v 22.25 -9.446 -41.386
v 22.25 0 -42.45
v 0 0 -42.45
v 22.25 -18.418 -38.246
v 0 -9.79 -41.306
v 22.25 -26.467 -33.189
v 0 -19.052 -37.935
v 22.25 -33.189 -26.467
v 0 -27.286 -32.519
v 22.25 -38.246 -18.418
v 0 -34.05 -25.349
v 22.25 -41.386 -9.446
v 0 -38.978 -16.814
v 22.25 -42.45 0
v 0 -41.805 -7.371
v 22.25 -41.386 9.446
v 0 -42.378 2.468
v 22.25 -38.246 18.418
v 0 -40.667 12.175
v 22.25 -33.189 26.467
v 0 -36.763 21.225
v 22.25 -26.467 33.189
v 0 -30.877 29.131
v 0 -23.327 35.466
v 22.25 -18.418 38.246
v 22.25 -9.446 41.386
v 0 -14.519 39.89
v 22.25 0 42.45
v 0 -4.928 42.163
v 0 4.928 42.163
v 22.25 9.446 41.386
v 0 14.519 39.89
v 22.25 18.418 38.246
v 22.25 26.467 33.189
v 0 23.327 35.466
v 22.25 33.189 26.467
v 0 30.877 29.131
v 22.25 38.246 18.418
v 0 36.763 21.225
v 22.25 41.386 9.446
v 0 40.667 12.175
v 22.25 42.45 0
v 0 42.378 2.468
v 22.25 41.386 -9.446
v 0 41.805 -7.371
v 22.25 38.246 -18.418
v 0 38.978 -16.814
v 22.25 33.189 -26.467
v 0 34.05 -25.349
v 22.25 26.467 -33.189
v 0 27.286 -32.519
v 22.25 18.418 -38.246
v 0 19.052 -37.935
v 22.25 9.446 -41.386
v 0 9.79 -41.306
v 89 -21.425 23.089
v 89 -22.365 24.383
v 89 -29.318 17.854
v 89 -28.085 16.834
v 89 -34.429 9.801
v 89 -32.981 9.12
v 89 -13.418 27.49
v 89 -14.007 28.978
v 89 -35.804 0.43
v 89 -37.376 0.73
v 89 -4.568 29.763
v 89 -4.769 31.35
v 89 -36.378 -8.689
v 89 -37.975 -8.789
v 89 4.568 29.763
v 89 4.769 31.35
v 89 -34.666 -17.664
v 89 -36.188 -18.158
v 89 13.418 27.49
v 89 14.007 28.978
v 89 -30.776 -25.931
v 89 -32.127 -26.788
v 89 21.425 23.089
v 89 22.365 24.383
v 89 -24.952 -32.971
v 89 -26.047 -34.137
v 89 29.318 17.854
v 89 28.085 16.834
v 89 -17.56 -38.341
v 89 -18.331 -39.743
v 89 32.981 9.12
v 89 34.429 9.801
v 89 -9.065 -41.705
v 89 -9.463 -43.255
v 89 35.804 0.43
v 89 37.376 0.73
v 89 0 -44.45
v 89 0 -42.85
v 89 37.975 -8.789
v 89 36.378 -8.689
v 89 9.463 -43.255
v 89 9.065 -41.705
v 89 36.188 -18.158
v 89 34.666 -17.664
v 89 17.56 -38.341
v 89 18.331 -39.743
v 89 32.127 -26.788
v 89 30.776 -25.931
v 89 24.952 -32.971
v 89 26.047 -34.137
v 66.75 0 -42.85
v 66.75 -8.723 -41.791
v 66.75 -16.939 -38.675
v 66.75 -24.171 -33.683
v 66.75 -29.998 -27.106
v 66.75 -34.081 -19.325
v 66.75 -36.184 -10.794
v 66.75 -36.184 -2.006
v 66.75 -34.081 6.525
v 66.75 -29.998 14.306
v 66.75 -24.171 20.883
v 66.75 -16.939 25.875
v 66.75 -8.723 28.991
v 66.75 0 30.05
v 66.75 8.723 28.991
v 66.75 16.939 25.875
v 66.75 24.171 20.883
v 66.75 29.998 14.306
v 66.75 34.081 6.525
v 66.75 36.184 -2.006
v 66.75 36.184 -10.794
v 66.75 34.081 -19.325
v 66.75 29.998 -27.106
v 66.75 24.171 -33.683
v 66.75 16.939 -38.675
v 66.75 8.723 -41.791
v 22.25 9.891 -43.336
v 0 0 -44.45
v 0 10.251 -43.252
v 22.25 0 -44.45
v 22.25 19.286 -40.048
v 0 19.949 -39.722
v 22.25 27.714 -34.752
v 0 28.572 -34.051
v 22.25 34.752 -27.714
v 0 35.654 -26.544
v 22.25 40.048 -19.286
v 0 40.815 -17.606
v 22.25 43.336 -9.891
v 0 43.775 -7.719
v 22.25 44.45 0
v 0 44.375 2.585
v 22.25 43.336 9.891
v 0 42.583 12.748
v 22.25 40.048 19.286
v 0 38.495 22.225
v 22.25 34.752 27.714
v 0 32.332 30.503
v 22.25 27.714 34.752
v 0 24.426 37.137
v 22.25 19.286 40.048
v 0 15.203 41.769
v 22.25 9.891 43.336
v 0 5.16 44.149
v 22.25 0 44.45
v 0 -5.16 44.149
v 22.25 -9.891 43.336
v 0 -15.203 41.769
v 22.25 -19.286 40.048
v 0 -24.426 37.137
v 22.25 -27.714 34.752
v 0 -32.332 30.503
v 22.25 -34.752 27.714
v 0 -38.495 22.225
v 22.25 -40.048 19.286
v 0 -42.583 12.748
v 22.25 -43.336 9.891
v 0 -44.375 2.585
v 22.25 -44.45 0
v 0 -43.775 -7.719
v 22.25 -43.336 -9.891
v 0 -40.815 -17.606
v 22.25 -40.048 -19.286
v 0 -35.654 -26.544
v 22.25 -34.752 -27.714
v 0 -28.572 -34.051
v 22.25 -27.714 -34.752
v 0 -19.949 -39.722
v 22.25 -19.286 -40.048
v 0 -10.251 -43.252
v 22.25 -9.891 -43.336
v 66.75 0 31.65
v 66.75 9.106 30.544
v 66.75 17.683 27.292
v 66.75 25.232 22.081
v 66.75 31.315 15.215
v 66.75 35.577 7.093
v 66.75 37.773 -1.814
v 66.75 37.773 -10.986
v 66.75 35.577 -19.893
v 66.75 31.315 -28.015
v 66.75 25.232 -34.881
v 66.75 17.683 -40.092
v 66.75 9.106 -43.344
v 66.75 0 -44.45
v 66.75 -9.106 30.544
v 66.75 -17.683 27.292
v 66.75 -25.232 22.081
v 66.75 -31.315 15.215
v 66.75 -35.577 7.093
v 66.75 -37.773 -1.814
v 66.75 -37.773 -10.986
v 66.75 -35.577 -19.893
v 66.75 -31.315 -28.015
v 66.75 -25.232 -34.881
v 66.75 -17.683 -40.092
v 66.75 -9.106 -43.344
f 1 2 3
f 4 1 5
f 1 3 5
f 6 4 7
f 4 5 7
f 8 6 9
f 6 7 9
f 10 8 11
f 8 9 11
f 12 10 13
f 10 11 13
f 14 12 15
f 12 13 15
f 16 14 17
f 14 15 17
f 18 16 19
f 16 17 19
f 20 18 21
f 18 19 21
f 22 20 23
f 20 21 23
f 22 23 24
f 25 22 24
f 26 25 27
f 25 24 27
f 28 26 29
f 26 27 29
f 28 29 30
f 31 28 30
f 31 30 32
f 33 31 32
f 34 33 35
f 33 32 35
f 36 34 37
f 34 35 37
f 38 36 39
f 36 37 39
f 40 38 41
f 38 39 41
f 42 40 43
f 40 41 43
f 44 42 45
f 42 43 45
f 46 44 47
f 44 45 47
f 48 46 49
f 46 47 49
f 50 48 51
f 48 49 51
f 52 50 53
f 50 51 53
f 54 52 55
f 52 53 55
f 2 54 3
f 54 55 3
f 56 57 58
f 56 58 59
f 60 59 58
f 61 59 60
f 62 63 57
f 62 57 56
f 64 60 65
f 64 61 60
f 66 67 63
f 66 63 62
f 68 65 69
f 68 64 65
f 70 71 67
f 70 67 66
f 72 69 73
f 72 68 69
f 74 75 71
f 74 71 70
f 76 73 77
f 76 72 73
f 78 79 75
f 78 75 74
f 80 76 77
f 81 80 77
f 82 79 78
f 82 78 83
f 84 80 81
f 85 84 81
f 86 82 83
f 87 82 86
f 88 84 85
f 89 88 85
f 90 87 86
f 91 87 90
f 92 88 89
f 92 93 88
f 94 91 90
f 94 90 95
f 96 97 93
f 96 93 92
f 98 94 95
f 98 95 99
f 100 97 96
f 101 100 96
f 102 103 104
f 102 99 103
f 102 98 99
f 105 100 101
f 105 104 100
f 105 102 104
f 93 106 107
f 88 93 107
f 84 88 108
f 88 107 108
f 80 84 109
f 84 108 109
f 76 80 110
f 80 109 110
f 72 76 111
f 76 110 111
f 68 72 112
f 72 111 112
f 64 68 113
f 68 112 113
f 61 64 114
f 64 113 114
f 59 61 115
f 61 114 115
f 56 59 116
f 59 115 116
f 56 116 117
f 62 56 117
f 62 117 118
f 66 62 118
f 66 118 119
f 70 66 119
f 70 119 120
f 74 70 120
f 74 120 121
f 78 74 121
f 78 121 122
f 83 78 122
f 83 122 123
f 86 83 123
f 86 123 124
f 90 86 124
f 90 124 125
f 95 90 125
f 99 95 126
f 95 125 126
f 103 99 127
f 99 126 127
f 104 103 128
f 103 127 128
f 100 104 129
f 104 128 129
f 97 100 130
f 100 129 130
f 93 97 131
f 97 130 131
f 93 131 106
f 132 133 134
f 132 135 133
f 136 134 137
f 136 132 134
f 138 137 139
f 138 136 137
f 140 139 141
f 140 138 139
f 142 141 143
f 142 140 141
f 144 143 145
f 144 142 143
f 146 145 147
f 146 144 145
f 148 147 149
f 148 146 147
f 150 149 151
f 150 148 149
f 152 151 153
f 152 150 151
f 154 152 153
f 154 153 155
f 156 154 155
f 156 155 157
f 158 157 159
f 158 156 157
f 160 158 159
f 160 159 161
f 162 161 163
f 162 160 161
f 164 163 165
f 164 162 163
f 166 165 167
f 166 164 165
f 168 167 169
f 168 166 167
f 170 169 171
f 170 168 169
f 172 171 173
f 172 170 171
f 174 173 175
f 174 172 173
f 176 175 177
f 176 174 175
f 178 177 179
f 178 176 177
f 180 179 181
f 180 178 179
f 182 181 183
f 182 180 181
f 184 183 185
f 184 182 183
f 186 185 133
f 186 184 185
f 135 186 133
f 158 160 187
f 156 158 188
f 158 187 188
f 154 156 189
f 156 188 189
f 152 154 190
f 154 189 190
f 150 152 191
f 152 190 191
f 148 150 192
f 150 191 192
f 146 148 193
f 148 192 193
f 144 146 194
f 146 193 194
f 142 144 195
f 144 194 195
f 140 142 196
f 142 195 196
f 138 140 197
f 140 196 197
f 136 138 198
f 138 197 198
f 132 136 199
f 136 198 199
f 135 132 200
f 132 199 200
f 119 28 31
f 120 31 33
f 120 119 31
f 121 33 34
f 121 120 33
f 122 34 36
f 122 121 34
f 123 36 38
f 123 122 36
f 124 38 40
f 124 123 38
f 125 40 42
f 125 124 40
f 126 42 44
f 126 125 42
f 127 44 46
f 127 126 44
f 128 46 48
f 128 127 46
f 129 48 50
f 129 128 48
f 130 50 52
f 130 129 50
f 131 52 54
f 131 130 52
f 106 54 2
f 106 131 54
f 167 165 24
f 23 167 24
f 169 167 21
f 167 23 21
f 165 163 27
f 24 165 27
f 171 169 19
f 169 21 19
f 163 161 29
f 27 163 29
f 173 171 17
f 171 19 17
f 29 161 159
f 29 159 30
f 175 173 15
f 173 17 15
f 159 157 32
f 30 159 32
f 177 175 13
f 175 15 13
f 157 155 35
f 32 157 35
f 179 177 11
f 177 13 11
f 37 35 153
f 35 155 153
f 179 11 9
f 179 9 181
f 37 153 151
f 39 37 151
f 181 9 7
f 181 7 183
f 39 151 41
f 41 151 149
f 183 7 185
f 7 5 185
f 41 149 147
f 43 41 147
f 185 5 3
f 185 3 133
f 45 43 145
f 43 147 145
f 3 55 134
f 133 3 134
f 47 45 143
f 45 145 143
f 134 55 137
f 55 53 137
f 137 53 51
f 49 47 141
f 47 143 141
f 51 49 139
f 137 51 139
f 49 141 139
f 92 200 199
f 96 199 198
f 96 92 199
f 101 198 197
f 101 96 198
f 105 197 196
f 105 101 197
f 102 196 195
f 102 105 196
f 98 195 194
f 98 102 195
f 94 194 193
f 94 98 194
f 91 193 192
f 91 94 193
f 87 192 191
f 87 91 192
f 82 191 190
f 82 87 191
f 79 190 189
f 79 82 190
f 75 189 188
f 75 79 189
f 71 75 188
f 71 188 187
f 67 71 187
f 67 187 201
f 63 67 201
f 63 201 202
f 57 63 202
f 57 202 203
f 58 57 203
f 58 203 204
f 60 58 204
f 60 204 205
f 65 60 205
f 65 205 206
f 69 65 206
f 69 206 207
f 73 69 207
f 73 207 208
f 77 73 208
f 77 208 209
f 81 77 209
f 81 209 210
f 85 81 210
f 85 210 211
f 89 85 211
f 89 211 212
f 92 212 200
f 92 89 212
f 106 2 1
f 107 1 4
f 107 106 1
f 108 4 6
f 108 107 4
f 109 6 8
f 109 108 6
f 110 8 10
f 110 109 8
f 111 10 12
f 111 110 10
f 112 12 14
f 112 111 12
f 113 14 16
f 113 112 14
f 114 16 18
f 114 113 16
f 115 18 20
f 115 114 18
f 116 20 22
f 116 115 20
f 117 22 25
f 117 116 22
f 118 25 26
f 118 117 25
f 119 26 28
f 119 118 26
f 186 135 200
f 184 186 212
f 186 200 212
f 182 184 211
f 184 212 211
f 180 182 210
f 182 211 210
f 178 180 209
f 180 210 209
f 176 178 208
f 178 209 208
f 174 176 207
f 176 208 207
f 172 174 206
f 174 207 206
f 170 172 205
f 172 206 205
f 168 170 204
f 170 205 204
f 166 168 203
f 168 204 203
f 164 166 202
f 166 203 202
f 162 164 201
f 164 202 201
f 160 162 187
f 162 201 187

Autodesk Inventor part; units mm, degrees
ref_plane "YZ Plane" through (0, 0, 0) normal (1, 0, 0) x (0, 1, 0)
ref_plane "XZ Plane" through (0, 0, 0) normal (0, 1, 0) x (-1, 0, 0)
ref_plane "XY Plane" through (0, 0, 0) normal (0, 0, 1) x (1, 0, 0)
sketch "Sketch1" plane through (0, 0, 0) normal (0, 1, 0) x (-1, 0, 0)
  line L0 (0, -44.45) -> (-22.25, -44.45)
  line L1 (-22.25, -44.45) -> (-22.25, -42.45)
  line L2 (-22.25, -42.45) -> (0, -42.45)
  line L3 (0, -42.45) -> (0, -44.45)
  line L4 (0, -42.45) -> (0, 0) construction
  line L5 (0, 0) -> (-22.25, 0)
  line L6 (-22.25, 0) -> (-22.25, -42.45) construction
  dimension "d0" = 2
  dimension "d1" = 22.25
  dimension "d15" = 88.9
revolve "Revolve1" add sketch "Sketch1" angle 360 about axis through (0, 0, 0) along (1, 0, 0)
sketch "Sketch2" plane through (0, 0, 0) normal (0, 1, 0) x (-1, 0, 0)
  line L0 (0, -44.45) -> (-22.25, -44.45) projected
  line L1 (-66.75, -44.45) -> (-89, -44.45)
  line L2 (-89, -44.45) -> (-89, -42.85)
  line L3 (-89, -42.85) -> (-66.75, -42.85)
  line L4 (-66.75, -42.85) -> (-66.75, -44.45)
  line L5 (-22.25, -44.45) -> (-66.75, -44.45) construction
  line L6 (-66.75, -42.85) -> (-66.75, -6.4) construction
  line L7 (-66.75, -6.4) -> (-89, -6.4) construction
  line L8 (-89, -6.4) -> (-89, -42.85) construction
  dimension "d2" = 44.5
  dimension "d4" = 1.6
  dimension "d5" = 22.25
  dimension "d16" = 76.1
revolve "Revolve2" add sketch "Sketch2" angle 360 about axis through (66.75, 0, -6.4) along (1, 0, 0)
sketch "Sketch3" plane through (66.75, 0, -6.4) normal (-1, 0, 0) x (0, 0, 1)
  circle A0 centre (0, 0) radius 38.05 projected
loft "Loft1" add profiles "Sketch3" section 1 edges at (22.25, 0, 44.45)
sketch "Sketch4" plane through (22.25, 0, 0) normal (-1, 0, 0) x (0, 0, 1)
  circle A0 centre (0, 0) radius 42.45
  circle A1 centre (0, 0) radius 42.45 projected
sketch "Sketch5" plane through (66.75, 0, -6.4) normal (1, 0, 0) x (0, 0, -1)
  circle A0 centre (0, 0) radius 36.45
  circle A1 centre (0, 0) radius 36.45 projected
loft "Loft2" cut profiles "Sketch4", "Sketch5"
equation "\"d0\" = T"
equation "\"d1\" = 0.25 * L"
equation "\"d15\" = D"
equation "\"d2\" = 0.5 * L"
equation "\"d4\" = T1"
equation "\"d5\" = 0.25 * L"
equation "\"d16\" = D1"
equation "\"D\" = 88.9"
equation "\"T\" = 2"
equation "\"L\" = 89"
equation "\"D1\" = 76.1"
equation "\"T1\" = 1.6"
equation "\"Size_Designation\" = 1.2345"
properties part number "ISO 5251 Eccentric reducers DN80 x DN65 2" material "Stainless Steel"
